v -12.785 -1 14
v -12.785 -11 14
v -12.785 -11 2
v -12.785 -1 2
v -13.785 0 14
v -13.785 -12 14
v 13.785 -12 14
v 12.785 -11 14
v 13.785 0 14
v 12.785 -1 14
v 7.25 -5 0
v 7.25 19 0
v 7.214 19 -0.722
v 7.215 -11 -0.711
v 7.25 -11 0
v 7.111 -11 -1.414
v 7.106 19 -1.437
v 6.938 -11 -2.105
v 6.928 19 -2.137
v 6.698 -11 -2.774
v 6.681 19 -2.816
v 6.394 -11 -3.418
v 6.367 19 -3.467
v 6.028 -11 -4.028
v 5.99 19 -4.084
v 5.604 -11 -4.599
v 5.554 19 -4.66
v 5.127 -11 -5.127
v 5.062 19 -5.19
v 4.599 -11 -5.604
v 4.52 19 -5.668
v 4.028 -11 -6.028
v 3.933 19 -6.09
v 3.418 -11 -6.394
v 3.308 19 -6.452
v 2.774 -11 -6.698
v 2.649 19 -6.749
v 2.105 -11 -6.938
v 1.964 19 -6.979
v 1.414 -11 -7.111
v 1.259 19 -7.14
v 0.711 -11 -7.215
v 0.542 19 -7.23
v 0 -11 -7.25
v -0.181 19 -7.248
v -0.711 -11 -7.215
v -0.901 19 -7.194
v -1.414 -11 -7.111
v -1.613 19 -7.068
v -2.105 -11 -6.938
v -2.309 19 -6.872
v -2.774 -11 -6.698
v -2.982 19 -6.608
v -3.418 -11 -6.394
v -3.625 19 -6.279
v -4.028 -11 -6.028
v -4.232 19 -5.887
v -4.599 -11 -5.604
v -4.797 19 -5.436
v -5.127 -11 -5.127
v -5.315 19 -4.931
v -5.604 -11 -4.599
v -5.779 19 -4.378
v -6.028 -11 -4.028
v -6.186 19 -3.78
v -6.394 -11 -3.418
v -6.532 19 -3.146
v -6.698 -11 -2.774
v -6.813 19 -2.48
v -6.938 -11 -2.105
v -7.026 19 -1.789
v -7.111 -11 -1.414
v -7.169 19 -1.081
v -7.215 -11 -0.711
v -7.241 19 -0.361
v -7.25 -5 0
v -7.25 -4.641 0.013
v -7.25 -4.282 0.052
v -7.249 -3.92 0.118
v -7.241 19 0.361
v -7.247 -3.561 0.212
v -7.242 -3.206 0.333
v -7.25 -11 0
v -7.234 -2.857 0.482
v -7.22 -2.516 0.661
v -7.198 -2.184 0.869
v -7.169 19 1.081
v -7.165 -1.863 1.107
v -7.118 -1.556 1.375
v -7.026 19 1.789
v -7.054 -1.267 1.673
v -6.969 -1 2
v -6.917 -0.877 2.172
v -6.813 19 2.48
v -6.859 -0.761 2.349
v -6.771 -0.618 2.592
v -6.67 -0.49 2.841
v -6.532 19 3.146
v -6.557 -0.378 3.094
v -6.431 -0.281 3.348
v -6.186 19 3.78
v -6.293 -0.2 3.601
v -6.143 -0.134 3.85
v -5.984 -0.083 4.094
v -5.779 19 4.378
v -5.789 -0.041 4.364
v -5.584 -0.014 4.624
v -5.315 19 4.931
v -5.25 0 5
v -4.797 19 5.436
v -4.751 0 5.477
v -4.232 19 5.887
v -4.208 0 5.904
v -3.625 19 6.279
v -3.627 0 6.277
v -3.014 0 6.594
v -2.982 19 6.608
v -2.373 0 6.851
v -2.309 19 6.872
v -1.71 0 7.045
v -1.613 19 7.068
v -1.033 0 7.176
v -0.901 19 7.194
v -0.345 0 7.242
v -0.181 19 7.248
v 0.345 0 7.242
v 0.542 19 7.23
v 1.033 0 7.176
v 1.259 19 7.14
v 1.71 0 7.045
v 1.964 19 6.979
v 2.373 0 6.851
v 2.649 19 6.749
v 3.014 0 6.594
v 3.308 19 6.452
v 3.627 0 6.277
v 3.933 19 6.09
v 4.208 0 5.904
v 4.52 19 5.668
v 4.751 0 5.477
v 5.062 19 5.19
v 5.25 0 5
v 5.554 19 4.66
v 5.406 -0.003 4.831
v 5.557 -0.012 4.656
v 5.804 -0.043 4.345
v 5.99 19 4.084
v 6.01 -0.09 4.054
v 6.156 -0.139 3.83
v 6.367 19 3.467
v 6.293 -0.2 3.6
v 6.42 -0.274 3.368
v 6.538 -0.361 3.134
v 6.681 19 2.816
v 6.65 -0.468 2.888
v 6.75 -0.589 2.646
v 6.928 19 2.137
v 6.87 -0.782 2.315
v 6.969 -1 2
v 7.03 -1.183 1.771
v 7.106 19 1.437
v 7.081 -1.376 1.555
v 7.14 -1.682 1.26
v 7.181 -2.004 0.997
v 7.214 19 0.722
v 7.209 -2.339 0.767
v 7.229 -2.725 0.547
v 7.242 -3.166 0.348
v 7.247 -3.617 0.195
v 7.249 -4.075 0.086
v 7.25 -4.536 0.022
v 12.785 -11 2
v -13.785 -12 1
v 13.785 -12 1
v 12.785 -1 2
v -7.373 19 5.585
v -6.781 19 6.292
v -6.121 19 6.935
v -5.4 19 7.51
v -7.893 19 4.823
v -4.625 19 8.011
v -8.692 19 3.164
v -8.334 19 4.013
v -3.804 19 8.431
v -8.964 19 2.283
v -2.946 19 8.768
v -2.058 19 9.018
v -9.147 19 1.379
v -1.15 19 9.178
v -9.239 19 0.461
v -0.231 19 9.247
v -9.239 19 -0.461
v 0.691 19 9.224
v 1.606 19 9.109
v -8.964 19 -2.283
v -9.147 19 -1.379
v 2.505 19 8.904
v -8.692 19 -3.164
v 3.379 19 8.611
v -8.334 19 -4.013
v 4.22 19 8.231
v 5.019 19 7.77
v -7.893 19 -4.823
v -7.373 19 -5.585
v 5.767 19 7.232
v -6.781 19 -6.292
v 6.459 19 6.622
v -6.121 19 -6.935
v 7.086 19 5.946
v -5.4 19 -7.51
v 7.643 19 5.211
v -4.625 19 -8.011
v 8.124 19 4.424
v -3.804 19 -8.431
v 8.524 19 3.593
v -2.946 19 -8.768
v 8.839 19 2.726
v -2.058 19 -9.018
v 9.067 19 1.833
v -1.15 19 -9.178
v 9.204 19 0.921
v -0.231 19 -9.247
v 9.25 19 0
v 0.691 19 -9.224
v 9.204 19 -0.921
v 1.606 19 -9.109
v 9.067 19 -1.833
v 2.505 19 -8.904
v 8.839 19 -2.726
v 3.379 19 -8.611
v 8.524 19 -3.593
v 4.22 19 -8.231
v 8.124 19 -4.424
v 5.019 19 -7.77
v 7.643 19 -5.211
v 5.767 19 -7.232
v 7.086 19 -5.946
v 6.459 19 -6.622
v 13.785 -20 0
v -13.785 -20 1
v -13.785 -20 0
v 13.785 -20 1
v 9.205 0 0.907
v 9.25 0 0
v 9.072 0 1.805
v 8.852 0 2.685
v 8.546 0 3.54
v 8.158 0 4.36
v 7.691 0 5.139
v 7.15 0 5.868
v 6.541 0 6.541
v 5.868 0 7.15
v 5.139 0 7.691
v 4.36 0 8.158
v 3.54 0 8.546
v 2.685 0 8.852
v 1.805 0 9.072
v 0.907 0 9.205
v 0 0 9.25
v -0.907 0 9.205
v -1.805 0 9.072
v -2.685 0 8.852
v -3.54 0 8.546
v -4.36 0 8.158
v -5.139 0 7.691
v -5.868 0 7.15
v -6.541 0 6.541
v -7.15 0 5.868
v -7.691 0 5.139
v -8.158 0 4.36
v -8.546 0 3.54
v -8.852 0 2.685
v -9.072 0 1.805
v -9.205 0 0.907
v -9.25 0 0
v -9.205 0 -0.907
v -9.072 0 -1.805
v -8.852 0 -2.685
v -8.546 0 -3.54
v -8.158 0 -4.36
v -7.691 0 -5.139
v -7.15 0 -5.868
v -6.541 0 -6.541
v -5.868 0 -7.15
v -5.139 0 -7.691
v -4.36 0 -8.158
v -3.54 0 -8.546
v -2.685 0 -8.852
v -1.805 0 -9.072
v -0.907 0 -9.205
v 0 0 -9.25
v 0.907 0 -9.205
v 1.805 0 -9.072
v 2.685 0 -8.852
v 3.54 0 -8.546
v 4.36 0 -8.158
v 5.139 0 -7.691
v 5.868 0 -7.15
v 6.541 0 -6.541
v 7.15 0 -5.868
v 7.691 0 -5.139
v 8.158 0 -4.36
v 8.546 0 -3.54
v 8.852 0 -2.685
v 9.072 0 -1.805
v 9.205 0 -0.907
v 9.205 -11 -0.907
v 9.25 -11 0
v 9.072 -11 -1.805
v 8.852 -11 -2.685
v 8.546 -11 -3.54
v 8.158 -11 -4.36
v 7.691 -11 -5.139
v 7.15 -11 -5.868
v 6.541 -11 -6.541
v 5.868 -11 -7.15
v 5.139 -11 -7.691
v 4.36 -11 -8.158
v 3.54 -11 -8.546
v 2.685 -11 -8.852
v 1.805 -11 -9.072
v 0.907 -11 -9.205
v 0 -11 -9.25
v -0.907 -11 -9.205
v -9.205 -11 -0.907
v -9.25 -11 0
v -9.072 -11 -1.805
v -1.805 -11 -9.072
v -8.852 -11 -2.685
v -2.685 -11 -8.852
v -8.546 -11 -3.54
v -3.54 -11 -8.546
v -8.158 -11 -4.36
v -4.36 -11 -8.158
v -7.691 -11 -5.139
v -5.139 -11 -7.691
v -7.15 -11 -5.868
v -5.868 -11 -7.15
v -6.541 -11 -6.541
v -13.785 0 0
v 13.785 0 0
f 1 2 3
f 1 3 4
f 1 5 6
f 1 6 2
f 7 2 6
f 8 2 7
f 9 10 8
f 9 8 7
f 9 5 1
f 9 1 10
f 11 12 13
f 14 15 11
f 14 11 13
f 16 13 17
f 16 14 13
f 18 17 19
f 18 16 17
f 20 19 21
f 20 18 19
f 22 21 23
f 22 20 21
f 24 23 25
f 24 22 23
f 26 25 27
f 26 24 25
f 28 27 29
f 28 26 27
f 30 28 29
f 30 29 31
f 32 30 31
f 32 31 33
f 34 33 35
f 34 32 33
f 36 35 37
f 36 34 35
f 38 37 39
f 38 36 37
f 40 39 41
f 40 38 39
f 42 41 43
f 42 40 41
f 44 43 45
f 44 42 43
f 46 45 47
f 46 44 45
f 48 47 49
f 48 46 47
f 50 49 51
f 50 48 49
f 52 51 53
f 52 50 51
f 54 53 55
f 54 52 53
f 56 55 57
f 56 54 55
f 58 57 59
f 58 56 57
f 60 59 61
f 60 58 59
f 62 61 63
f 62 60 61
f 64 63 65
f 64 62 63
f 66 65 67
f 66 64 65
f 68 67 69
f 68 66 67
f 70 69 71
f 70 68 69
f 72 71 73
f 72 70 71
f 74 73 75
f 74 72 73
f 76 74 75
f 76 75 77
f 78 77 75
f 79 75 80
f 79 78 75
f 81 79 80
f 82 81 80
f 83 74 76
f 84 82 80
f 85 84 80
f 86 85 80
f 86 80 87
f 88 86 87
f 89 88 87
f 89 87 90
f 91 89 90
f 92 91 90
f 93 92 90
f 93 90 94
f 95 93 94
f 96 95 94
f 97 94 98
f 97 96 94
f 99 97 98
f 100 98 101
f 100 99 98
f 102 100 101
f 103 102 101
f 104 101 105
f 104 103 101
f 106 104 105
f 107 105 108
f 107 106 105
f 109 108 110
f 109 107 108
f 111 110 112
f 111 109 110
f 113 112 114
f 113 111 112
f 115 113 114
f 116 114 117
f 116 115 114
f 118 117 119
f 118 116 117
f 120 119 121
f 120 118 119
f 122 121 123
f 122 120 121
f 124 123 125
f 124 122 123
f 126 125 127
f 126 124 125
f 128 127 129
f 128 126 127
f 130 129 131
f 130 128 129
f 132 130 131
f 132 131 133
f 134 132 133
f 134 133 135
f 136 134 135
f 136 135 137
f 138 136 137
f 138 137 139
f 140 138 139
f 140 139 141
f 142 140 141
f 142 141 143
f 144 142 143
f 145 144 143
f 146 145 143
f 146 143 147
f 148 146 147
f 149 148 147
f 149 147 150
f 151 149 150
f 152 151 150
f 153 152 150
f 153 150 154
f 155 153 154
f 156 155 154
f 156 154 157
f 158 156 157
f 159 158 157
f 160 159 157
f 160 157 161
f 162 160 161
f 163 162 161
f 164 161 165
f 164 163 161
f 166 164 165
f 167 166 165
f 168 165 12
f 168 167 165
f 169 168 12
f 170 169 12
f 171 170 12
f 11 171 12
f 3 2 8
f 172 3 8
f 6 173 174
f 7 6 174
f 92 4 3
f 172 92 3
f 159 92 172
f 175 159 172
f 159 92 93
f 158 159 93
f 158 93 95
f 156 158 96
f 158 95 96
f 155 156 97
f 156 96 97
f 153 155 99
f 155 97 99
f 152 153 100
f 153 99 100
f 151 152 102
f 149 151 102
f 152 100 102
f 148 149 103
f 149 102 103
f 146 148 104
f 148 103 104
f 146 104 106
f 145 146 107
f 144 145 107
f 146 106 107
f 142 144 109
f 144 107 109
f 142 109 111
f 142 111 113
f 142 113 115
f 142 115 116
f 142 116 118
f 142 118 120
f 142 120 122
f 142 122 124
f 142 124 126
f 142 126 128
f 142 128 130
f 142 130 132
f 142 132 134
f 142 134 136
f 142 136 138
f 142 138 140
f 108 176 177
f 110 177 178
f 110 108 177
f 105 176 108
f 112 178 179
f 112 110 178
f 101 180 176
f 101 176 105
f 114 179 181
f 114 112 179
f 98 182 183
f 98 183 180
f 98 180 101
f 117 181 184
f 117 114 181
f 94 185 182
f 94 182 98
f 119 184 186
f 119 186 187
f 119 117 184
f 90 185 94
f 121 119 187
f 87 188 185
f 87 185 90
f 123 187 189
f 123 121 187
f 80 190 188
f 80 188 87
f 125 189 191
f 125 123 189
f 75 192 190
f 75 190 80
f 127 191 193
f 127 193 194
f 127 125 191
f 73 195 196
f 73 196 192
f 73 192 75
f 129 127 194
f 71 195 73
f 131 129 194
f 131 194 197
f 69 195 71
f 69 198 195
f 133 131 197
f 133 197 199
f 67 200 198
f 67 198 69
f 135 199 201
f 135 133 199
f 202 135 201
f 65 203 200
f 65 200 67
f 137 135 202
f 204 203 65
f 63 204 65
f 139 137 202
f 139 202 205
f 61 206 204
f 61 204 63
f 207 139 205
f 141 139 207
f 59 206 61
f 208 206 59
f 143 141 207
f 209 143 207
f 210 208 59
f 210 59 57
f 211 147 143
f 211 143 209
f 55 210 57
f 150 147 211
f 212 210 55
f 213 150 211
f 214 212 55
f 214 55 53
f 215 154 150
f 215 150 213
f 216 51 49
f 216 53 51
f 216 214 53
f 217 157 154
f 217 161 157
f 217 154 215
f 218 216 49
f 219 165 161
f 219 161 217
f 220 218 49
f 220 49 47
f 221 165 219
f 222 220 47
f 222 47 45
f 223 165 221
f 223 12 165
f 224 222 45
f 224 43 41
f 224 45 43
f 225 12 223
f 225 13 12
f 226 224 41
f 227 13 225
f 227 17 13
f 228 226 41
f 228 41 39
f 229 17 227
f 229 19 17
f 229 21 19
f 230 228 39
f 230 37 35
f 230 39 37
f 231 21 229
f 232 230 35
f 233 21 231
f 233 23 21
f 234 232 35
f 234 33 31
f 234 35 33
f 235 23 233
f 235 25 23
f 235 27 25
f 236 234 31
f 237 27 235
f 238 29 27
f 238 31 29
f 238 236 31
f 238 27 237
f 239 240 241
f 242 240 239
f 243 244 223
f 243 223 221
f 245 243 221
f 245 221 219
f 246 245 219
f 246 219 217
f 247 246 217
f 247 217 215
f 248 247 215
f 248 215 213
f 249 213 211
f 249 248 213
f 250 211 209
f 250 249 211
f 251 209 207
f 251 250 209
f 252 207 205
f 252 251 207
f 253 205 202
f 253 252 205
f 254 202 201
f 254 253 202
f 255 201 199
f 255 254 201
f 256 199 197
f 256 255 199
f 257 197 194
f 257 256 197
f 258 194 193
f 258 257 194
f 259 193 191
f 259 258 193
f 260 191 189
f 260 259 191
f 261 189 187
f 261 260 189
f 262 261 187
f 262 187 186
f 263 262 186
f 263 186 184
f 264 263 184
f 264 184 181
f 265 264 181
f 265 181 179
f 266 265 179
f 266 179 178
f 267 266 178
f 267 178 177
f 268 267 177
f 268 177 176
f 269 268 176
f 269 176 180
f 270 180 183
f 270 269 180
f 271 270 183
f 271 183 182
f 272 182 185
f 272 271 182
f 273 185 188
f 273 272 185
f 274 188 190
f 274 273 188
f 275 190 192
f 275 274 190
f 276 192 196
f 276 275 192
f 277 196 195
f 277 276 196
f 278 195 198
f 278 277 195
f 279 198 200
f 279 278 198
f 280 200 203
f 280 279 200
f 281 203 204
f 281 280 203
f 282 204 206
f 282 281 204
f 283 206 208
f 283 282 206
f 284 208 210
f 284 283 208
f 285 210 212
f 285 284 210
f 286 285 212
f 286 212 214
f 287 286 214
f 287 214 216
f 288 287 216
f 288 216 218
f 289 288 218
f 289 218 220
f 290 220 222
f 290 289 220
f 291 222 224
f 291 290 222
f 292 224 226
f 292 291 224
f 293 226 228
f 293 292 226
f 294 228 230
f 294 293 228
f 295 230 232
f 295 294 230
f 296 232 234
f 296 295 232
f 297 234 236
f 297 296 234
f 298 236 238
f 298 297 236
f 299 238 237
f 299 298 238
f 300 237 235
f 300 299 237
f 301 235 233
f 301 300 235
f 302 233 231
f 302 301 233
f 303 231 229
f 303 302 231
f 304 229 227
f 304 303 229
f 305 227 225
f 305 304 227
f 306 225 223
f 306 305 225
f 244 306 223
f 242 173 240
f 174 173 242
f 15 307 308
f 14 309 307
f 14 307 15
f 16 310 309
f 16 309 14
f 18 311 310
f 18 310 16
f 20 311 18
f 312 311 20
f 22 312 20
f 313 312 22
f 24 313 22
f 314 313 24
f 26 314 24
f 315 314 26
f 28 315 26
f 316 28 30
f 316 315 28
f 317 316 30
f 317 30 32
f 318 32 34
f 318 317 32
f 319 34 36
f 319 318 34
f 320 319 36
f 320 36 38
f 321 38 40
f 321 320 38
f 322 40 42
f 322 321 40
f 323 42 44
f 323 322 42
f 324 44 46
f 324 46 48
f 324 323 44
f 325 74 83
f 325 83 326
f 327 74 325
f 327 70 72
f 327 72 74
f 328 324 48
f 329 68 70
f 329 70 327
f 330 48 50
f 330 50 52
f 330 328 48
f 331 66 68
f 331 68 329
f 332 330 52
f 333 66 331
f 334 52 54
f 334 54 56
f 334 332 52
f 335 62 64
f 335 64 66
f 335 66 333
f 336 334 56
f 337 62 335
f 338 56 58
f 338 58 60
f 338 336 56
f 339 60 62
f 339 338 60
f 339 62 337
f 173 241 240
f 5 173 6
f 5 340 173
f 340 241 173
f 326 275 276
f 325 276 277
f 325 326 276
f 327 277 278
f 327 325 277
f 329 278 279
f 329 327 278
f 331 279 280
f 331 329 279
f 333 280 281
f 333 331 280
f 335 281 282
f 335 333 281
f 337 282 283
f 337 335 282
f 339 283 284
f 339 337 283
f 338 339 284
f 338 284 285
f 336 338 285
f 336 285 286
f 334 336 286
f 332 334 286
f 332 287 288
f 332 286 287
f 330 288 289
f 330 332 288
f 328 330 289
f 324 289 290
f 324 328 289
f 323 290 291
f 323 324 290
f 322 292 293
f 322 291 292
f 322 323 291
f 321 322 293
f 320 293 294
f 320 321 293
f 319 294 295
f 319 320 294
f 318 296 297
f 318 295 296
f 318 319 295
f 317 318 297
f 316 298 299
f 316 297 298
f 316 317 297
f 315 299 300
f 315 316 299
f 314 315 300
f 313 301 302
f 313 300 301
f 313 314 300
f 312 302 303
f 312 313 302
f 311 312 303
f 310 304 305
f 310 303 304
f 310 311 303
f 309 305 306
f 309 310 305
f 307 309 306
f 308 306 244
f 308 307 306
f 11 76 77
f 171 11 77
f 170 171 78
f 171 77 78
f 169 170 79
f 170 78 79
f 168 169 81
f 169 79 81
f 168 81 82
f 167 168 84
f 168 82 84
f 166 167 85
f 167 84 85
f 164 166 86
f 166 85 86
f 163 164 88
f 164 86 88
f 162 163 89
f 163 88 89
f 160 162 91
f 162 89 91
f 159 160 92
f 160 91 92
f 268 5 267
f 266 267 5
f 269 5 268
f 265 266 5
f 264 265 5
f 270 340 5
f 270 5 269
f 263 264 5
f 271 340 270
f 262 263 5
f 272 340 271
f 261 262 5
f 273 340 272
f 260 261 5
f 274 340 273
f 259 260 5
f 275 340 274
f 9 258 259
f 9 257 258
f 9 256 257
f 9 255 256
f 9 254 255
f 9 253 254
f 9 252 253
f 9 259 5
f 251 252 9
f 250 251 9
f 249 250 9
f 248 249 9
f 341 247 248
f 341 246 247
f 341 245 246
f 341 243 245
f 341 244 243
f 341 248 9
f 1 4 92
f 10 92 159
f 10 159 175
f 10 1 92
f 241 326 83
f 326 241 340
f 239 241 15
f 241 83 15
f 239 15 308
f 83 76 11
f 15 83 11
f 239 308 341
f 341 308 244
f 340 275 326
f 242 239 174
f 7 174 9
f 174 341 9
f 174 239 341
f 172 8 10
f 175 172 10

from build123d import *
from build123d.topology import SkipClean

# Parameters (mm, degrees)
SKETCH_2_R          = 9.25
SKETCH_2_R_2        = 7.25
F_19MM_DEPTH        = 19
EXTRUDE_START       = -11
EXTRUDE_7_DEPTH     = 11
SKETCH_630_W        = 27.57
SKETCH_630_H        = 12
EXTRUDE_682_DEPTH   = 14
SKETCH_6_W          = 25.57
SKETCH_6_H          = 10
CUT_EXTRUDE_1_DEPTH = 12
FILLET_1_R          = 5
SKETCH_10_W         = 27.57
SKETCH_10_H         = 1
EXTRUDE_3_DEPTH     = 8


with BuildPart() as part:
    # 草圖2 → 19mm (new body)
    with BuildSketch(Plane(origin=(0, 0, 0), x_dir=(1, 0, 0), z_dir=(0, 1, 0))):
        Circle(SKETCH_2_R)
        Circle(SKETCH_2_R_2, mode=Mode.SUBTRACT)
    extrude(amount=F_19MM_DEPTH)

    # 草圖14 → 伸長-薄件7 (add)
    with SkipClean():  # the faces are left unmerged after this step: merging them gives an invalid solid
        with BuildSketch(Plane(origin=(0, 0, 0), x_dir=(1, 0, 0), z_dir=(0, 1, 0)).offset(EXTRUDE_START)):
            with BuildLine():
                ThreePointArc((7.25, 0), (0, 7.25), (-7.25, 0))
                Line((-7.25, 0), (-9.25, 0))
                ThreePointArc((-9.25, 0), (0, 9.25), (9.25, 0))
                Line((9.25, 0), (7.25, 0))
            make_face()
        extrude(amount=EXTRUDE_7_DEPTH)

    # Sketch 630 → Extrude 682 (add)
    with SkipClean():  # the faces are left unmerged after this step: merging them gives an invalid solid
        with BuildSketch(Plane.XY):
            with Locations((0, -6)):
                Rectangle(SKETCH_630_W, SKETCH_630_H)
        extrude(amount=EXTRUDE_682_DEPTH)

    # 草圖6 → 除料-伸長1 (cut)
    with SkipClean():  # the faces are left unmerged after this step: merging them gives an invalid solid
        with BuildSketch(Plane.XY.offset(14)):
            with Locations((0, -6)):
                Rectangle(SKETCH_6_W, SKETCH_6_H)
        extrude(amount=-CUT_EXTRUDE_1_DEPTH, mode=Mode.SUBTRACT)

    # 圓角1
    # the kernel refuses this fillet: 5 mm, written as the material it takes off along each edge
    with BuildSketch(Plane(origin=(-19.75, 0, 0), x_dir=(0, -1, 0), z_dir=(1, 0, 0))) as fillet_1_piece_1_section:
        with BuildLine():
            CenterArc((FILLET_1_R, -FILLET_1_R), FILLET_1_R, 90, 90)
            Line((0, -FILLET_1_R), (0, 0))
            Line((0, 0), (FILLET_1_R, 0))
        make_face()
    fillet_1_piece_1 = extrude(amount=39.5, mode=Mode.PRIVATE)
    fillet_1_piece_1 = fillet_1_piece_1 & Plane(origin=(0, -1.958227167, 0), x_dir=(1, 0, 0), z_dir=(0, -1, 0)) * Cylinder(7.25, 99, mode=Mode.PRIVATE)
    add(fillet_1_piece_1, mode=Mode.SUBTRACT)

    # 草圖10 → 填料-伸長3 (add)
    with BuildSketch(Plane.XZ.offset(12)):
        with Locations((0, 0.5)):
            Rectangle(SKETCH_10_W, SKETCH_10_H)
    extrude(amount=EXTRUDE_3_DEPTH)


solid = part.part
